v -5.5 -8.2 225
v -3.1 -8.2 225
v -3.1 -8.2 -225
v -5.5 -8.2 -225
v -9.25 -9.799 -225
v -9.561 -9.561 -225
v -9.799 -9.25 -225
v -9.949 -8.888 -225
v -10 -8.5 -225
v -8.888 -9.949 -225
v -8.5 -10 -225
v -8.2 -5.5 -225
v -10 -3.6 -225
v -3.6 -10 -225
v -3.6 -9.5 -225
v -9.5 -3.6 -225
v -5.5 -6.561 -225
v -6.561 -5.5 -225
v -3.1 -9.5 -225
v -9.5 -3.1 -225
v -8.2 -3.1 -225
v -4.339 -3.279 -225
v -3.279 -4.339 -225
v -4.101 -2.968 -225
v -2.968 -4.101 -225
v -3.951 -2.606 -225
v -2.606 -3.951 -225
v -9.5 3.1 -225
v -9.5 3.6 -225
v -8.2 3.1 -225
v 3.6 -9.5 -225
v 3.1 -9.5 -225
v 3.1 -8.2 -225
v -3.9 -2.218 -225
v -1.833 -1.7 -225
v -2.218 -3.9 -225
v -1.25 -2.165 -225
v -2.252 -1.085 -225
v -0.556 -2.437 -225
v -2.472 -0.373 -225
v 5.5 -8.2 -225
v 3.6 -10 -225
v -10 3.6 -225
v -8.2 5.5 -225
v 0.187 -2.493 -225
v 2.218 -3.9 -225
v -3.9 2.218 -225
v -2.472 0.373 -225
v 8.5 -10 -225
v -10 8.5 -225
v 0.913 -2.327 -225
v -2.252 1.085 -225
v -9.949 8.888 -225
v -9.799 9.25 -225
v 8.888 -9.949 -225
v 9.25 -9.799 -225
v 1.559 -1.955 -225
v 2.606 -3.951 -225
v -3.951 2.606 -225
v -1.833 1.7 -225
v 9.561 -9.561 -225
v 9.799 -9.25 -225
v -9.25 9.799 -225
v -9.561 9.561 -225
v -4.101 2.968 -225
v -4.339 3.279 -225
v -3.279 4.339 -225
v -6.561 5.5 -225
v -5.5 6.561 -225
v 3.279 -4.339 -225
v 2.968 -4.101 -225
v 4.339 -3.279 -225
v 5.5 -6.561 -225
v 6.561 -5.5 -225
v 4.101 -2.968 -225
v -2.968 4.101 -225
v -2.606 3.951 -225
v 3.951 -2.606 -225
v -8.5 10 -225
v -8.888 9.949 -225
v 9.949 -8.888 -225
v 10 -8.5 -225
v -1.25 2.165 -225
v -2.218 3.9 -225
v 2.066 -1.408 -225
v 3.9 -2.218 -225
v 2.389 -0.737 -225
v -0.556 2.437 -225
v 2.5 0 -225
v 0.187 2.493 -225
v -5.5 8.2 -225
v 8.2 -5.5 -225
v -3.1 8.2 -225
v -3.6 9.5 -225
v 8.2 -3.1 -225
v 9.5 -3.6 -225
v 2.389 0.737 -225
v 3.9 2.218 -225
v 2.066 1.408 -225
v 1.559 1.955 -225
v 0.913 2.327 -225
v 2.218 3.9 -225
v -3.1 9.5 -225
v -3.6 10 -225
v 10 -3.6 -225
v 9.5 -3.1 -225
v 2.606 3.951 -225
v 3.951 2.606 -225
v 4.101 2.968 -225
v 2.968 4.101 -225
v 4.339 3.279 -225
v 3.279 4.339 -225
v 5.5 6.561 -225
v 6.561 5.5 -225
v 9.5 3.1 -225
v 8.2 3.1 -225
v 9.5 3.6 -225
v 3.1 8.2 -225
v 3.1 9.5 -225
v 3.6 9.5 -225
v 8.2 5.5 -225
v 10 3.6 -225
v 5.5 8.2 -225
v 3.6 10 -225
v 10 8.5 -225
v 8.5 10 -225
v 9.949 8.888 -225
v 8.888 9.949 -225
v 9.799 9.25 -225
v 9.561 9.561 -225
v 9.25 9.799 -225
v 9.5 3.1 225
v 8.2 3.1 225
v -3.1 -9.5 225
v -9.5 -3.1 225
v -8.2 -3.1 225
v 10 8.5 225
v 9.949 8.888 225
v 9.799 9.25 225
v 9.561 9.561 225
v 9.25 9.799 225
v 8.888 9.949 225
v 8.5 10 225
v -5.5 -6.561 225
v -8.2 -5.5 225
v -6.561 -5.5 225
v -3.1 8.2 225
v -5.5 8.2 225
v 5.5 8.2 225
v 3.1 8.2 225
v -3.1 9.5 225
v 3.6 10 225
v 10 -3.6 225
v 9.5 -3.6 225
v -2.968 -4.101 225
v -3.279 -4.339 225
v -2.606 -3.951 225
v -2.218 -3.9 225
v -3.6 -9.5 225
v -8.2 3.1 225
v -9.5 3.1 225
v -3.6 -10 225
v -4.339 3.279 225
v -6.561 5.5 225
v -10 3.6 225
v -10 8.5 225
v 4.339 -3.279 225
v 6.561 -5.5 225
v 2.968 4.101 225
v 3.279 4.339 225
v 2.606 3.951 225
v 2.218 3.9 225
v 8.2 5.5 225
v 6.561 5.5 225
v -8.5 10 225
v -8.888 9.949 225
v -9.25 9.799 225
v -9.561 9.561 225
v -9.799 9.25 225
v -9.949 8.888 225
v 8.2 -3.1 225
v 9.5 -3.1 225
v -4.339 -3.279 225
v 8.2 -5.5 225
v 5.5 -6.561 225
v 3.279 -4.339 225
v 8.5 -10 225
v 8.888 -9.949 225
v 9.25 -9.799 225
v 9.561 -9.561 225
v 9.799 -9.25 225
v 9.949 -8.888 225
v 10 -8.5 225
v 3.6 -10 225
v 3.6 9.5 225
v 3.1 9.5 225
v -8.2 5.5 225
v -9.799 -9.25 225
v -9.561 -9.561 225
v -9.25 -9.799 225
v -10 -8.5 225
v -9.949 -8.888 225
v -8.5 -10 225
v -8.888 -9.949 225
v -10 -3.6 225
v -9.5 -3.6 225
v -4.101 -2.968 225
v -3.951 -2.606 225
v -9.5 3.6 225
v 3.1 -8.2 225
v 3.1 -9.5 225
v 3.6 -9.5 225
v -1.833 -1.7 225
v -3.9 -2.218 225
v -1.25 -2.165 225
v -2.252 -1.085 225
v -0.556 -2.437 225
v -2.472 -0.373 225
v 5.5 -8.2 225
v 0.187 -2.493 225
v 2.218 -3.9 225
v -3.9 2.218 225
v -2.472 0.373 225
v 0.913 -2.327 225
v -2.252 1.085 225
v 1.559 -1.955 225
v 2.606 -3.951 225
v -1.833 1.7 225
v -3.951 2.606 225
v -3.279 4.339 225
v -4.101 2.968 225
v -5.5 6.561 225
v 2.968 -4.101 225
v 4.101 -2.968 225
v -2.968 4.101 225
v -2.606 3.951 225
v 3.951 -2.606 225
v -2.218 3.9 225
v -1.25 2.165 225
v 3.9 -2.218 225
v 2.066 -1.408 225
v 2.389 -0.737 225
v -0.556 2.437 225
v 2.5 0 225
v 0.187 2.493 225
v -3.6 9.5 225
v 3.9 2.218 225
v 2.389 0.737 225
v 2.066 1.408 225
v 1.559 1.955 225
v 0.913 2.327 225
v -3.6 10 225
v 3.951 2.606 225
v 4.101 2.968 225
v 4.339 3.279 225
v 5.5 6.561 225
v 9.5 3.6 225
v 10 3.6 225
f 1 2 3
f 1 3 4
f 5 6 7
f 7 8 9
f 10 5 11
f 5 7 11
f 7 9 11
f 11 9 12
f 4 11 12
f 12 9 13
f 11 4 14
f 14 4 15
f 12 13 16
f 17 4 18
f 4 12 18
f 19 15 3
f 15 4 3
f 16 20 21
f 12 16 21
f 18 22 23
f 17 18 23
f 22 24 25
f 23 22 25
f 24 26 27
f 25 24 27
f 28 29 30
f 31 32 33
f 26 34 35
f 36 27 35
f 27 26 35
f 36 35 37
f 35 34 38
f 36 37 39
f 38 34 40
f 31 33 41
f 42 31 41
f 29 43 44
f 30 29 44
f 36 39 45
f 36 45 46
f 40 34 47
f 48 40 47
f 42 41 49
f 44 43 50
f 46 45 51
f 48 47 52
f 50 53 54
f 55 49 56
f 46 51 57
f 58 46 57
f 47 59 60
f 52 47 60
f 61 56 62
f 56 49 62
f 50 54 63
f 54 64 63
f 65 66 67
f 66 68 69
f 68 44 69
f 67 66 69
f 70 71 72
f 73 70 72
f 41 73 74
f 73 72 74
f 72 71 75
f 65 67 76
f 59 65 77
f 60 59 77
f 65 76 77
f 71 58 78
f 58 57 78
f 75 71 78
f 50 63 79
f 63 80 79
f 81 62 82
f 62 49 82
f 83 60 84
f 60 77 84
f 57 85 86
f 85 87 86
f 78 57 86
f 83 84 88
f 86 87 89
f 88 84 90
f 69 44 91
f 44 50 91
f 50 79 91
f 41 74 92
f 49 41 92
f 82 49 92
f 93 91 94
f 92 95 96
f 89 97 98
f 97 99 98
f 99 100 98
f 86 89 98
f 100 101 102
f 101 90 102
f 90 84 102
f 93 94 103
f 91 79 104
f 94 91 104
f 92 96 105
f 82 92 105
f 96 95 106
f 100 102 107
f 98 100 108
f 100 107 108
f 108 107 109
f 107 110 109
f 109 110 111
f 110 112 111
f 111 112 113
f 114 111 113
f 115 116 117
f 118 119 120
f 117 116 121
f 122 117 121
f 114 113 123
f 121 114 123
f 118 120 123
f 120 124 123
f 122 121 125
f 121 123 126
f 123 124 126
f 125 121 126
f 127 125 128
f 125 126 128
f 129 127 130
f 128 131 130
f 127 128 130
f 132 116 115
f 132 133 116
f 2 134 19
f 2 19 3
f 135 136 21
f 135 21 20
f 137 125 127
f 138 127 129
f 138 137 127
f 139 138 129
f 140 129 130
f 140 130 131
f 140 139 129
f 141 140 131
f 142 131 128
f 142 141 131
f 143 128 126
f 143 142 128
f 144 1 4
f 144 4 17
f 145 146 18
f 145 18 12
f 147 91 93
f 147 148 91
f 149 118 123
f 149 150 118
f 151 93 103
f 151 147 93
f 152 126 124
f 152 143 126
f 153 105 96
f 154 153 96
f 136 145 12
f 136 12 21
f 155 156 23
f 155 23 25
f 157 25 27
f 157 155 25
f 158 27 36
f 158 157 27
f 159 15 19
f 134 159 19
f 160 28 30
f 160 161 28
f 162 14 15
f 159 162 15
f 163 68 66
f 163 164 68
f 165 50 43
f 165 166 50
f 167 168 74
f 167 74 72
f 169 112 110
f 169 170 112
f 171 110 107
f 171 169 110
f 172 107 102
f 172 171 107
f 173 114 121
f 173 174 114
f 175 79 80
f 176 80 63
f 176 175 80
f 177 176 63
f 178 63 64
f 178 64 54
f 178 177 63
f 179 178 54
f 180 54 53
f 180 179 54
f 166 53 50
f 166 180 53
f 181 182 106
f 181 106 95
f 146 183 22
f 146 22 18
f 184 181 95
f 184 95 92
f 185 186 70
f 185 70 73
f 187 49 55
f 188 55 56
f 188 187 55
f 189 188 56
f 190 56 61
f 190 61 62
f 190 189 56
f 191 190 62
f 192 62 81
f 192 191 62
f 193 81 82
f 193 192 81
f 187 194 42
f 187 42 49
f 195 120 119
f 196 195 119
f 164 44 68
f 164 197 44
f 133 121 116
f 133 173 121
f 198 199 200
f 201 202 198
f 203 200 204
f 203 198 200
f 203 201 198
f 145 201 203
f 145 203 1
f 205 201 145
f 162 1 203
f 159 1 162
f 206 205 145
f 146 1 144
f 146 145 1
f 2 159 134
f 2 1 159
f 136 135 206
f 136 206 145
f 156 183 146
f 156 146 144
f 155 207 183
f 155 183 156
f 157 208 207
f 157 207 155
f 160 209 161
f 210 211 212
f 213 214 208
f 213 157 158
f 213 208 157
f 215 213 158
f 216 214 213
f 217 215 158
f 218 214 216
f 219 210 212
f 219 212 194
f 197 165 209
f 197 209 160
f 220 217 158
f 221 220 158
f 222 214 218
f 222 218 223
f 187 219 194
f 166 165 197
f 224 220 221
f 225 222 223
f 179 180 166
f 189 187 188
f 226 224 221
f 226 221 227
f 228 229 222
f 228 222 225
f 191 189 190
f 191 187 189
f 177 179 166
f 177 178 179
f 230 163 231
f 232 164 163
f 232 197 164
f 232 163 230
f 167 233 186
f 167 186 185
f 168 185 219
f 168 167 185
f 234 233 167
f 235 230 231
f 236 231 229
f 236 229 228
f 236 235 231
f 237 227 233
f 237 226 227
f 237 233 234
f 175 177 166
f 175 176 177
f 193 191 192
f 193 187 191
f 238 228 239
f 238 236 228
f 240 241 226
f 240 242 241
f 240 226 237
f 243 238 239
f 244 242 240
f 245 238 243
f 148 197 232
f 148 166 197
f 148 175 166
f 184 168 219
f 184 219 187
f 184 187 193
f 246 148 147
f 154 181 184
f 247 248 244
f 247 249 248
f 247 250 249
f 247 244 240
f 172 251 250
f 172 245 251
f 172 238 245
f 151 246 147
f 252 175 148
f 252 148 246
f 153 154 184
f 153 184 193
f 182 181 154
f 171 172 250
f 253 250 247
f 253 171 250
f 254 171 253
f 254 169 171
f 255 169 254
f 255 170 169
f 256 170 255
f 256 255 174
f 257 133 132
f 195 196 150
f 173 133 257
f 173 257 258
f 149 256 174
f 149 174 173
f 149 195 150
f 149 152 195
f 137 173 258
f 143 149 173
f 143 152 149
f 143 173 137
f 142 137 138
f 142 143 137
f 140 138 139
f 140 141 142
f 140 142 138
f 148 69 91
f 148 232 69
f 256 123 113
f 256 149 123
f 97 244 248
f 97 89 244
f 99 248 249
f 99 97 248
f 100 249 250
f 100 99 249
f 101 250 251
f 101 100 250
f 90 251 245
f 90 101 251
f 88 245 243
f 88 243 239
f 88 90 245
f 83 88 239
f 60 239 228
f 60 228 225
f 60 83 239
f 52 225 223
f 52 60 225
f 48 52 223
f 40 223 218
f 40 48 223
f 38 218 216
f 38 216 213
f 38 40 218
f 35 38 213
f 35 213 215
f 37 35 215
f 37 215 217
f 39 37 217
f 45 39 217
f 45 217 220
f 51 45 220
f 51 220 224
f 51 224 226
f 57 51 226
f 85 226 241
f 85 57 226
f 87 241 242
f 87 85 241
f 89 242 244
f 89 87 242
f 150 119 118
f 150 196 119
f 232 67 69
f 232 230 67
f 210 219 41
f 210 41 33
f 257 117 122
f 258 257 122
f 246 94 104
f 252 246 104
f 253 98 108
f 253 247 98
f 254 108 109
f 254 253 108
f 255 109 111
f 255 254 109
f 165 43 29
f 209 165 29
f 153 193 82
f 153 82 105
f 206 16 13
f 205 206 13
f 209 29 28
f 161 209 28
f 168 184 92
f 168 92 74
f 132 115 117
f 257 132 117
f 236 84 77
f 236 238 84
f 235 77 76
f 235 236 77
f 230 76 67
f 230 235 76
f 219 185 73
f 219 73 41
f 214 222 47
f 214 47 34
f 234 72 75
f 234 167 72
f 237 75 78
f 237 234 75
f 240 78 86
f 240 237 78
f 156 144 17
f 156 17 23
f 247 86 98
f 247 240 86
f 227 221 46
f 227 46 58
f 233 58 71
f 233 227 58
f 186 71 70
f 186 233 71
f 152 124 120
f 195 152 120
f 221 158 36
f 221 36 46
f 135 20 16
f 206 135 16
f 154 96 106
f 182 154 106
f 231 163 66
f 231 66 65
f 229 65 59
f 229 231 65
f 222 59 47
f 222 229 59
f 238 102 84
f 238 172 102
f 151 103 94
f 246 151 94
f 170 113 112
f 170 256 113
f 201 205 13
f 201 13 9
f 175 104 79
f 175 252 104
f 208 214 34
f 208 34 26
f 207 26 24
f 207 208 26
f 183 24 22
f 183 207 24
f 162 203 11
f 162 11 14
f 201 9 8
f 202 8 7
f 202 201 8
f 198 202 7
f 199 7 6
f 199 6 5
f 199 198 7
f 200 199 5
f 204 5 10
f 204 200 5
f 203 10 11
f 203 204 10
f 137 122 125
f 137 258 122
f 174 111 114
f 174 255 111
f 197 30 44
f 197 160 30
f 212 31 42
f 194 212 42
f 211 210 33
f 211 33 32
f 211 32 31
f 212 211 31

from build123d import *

# Parameters (mm, degrees)
SKETCH_1_R      = 2.5
EXTRUDE_1_DEPTH = 225


with BuildPart() as part:
    # 草图1 → 凸台-拉伸1 (new, symmetric)
    with BuildSketch(Plane.XY):
        with BuildLine():
            Line((-6.560660172, 5.5), (-4.339339828, 3.278679656))
            ThreePointArc((-4.339339828, 3.278679656), (-4.014180701, 2.792044633), (-3.9, 2.218019485))
            Line((-3.9, 2.218019485), (-3.9, -2.218019485))
            ThreePointArc((-3.9, -2.218019485), (-4.014180701, -2.792044633), (-4.339339828, -3.278679656))
            Line((-4.339339828, -3.278679656), (-6.560660172, -5.5))
            Line((-6.560660172, -5.5), (-8.2, -5.5))
            Line((-8.2, -5.5), (-8.2, -3.1))
            Line((-8.2, -3.1), (-9.5, -3.1))
            Line((-9.5, -3.1), (-9.5, -3.6))
            Line((-9.5, -3.6), (-10, -3.6))
            Line((-10, -3.6), (-10, -8.5))
            ThreePointArc((-10, -8.5), (-9.560660172, -9.560660172), (-8.5, -10))
            Line((-8.5, -10), (-3.6, -10))
            Line((-3.6, -10), (-3.6, -9.5))
            Line((-3.6, -9.5), (-3.1, -9.5))
            Line((-3.1, -9.5), (-3.1, -8.2))
            Line((-3.1, -8.2), (-5.5, -8.2))
            Line((-5.5, -8.2), (-5.5, -6.560660172))
            Line((-5.5, -6.560660172), (-3.278679656, -4.339339828))
            ThreePointArc((-3.278679656, -4.339339828), (-2.792044633, -4.014180701), (-2.218019485, -3.9))
            Line((-2.218019485, -3.9), (2.218019485, -3.9))
            ThreePointArc((2.218019485, -3.9), (2.792044633, -4.014180701), (3.278679656, -4.339339828))
            Line((3.278679656, -4.339339828), (5.5, -6.560660172))
            Line((5.5, -6.560660172), (5.5, -8.2))
            Line((5.5, -8.2), (3.1, -8.2))
            Line((3.1, -8.2), (3.1, -9.5))
            Line((3.1, -9.5), (3.6, -9.5))
            Line((3.6, -9.5), (3.6, -10))
            Line((3.6, -10), (8.5, -10))
            ThreePointArc((8.5, -10), (9.560660172, -9.560660172), (10, -8.5))
            Line((10, -8.5), (10, -3.6))
            Line((10, -3.6), (9.5, -3.6))
            Line((9.5, -3.6), (9.5, -3.1))
            Line((9.5, -3.1), (8.2, -3.1))
            Line((8.2, -3.1), (8.2, -5.5))
            Line((8.2, -5.5), (6.560660172, -5.5))
            Line((6.560660172, -5.5), (4.339339828, -3.278679656))
            ThreePointArc((4.339339828, -3.278679656), (4.014180701, -2.792044633), (3.9, -2.218019485))
            Line((3.9, -2.218019485), (3.9, 2.218019485))
            ThreePointArc((3.9, 2.218019485), (4.014180701, 2.792044633), (4.339339828, 3.278679656))
            Line((4.339339828, 3.278679656), (6.560660172, 5.5))
            Line((6.560660172, 5.5), (8.2, 5.5))
            Line((8.2, 5.5), (8.2, 3.1))
            Line((8.2, 3.1), (9.5, 3.1))
            Line((9.5, 3.1), (9.5, 3.6))
            Line((9.5, 3.6), (10, 3.6))
            Line((10, 3.6), (10, 8.5))
            ThreePointArc((10, 8.5), (9.560660172, 9.560660172), (8.5, 10))
            Line((8.5, 10), (3.6, 10))
            Line((3.6, 10), (3.6, 9.5))
            Line((3.6, 9.5), (3.1, 9.5))
            Line((3.1, 9.5), (3.1, 8.2))
            Line((3.1, 8.2), (5.5, 8.2))
            Line((5.5, 8.2), (5.5, 6.560660172))
            Line((5.5, 6.560660172), (3.278679656, 4.339339828))
            ThreePointArc((3.278679656, 4.339339828), (2.792044633, 4.014180701), (2.218019485, 3.9))
            Line((2.218019485, 3.9), (-2.218019485, 3.9))
            ThreePointArc((-2.218019485, 3.9), (-2.792044633, 4.014180701), (-3.278679656, 4.339339828))
            Line((-3.278679656, 4.339339828), (-5.5, 6.560660172))
            Line((-5.5, 6.560660172), (-5.5, 8.2))
            Line((-5.5, 8.2), (-3.1, 8.2))
            Line((-3.1, 8.2), (-3.1, 9.5))
            Line((-3.1, 9.5), (-3.6, 9.5))
            Line((-3.6, 9.5), (-3.6, 10))
            Line((-3.6, 10), (-8.5, 10))
            ThreePointArc((-8.5, 10), (-9.560660172, 9.560660172), (-10, 8.5))
            Line((-10, 8.5), (-10, 3.6))
            Line((-10, 3.6), (-9.5, 3.6))
            Line((-9.5, 3.6), (-9.5, 3.1))
            Line((-9.5, 3.1), (-8.2, 3.1))
            Line((-8.2, 3.1), (-8.2, 5.5))
            Line((-8.2, 5.5), (-6.560660172, 5.5))
        make_face()
        Circle(SKETCH_1_R, mode=Mode.SUBTRACT)
    extrude(amount=EXTRUDE_1_DEPTH, both=True)


solid = part.part
